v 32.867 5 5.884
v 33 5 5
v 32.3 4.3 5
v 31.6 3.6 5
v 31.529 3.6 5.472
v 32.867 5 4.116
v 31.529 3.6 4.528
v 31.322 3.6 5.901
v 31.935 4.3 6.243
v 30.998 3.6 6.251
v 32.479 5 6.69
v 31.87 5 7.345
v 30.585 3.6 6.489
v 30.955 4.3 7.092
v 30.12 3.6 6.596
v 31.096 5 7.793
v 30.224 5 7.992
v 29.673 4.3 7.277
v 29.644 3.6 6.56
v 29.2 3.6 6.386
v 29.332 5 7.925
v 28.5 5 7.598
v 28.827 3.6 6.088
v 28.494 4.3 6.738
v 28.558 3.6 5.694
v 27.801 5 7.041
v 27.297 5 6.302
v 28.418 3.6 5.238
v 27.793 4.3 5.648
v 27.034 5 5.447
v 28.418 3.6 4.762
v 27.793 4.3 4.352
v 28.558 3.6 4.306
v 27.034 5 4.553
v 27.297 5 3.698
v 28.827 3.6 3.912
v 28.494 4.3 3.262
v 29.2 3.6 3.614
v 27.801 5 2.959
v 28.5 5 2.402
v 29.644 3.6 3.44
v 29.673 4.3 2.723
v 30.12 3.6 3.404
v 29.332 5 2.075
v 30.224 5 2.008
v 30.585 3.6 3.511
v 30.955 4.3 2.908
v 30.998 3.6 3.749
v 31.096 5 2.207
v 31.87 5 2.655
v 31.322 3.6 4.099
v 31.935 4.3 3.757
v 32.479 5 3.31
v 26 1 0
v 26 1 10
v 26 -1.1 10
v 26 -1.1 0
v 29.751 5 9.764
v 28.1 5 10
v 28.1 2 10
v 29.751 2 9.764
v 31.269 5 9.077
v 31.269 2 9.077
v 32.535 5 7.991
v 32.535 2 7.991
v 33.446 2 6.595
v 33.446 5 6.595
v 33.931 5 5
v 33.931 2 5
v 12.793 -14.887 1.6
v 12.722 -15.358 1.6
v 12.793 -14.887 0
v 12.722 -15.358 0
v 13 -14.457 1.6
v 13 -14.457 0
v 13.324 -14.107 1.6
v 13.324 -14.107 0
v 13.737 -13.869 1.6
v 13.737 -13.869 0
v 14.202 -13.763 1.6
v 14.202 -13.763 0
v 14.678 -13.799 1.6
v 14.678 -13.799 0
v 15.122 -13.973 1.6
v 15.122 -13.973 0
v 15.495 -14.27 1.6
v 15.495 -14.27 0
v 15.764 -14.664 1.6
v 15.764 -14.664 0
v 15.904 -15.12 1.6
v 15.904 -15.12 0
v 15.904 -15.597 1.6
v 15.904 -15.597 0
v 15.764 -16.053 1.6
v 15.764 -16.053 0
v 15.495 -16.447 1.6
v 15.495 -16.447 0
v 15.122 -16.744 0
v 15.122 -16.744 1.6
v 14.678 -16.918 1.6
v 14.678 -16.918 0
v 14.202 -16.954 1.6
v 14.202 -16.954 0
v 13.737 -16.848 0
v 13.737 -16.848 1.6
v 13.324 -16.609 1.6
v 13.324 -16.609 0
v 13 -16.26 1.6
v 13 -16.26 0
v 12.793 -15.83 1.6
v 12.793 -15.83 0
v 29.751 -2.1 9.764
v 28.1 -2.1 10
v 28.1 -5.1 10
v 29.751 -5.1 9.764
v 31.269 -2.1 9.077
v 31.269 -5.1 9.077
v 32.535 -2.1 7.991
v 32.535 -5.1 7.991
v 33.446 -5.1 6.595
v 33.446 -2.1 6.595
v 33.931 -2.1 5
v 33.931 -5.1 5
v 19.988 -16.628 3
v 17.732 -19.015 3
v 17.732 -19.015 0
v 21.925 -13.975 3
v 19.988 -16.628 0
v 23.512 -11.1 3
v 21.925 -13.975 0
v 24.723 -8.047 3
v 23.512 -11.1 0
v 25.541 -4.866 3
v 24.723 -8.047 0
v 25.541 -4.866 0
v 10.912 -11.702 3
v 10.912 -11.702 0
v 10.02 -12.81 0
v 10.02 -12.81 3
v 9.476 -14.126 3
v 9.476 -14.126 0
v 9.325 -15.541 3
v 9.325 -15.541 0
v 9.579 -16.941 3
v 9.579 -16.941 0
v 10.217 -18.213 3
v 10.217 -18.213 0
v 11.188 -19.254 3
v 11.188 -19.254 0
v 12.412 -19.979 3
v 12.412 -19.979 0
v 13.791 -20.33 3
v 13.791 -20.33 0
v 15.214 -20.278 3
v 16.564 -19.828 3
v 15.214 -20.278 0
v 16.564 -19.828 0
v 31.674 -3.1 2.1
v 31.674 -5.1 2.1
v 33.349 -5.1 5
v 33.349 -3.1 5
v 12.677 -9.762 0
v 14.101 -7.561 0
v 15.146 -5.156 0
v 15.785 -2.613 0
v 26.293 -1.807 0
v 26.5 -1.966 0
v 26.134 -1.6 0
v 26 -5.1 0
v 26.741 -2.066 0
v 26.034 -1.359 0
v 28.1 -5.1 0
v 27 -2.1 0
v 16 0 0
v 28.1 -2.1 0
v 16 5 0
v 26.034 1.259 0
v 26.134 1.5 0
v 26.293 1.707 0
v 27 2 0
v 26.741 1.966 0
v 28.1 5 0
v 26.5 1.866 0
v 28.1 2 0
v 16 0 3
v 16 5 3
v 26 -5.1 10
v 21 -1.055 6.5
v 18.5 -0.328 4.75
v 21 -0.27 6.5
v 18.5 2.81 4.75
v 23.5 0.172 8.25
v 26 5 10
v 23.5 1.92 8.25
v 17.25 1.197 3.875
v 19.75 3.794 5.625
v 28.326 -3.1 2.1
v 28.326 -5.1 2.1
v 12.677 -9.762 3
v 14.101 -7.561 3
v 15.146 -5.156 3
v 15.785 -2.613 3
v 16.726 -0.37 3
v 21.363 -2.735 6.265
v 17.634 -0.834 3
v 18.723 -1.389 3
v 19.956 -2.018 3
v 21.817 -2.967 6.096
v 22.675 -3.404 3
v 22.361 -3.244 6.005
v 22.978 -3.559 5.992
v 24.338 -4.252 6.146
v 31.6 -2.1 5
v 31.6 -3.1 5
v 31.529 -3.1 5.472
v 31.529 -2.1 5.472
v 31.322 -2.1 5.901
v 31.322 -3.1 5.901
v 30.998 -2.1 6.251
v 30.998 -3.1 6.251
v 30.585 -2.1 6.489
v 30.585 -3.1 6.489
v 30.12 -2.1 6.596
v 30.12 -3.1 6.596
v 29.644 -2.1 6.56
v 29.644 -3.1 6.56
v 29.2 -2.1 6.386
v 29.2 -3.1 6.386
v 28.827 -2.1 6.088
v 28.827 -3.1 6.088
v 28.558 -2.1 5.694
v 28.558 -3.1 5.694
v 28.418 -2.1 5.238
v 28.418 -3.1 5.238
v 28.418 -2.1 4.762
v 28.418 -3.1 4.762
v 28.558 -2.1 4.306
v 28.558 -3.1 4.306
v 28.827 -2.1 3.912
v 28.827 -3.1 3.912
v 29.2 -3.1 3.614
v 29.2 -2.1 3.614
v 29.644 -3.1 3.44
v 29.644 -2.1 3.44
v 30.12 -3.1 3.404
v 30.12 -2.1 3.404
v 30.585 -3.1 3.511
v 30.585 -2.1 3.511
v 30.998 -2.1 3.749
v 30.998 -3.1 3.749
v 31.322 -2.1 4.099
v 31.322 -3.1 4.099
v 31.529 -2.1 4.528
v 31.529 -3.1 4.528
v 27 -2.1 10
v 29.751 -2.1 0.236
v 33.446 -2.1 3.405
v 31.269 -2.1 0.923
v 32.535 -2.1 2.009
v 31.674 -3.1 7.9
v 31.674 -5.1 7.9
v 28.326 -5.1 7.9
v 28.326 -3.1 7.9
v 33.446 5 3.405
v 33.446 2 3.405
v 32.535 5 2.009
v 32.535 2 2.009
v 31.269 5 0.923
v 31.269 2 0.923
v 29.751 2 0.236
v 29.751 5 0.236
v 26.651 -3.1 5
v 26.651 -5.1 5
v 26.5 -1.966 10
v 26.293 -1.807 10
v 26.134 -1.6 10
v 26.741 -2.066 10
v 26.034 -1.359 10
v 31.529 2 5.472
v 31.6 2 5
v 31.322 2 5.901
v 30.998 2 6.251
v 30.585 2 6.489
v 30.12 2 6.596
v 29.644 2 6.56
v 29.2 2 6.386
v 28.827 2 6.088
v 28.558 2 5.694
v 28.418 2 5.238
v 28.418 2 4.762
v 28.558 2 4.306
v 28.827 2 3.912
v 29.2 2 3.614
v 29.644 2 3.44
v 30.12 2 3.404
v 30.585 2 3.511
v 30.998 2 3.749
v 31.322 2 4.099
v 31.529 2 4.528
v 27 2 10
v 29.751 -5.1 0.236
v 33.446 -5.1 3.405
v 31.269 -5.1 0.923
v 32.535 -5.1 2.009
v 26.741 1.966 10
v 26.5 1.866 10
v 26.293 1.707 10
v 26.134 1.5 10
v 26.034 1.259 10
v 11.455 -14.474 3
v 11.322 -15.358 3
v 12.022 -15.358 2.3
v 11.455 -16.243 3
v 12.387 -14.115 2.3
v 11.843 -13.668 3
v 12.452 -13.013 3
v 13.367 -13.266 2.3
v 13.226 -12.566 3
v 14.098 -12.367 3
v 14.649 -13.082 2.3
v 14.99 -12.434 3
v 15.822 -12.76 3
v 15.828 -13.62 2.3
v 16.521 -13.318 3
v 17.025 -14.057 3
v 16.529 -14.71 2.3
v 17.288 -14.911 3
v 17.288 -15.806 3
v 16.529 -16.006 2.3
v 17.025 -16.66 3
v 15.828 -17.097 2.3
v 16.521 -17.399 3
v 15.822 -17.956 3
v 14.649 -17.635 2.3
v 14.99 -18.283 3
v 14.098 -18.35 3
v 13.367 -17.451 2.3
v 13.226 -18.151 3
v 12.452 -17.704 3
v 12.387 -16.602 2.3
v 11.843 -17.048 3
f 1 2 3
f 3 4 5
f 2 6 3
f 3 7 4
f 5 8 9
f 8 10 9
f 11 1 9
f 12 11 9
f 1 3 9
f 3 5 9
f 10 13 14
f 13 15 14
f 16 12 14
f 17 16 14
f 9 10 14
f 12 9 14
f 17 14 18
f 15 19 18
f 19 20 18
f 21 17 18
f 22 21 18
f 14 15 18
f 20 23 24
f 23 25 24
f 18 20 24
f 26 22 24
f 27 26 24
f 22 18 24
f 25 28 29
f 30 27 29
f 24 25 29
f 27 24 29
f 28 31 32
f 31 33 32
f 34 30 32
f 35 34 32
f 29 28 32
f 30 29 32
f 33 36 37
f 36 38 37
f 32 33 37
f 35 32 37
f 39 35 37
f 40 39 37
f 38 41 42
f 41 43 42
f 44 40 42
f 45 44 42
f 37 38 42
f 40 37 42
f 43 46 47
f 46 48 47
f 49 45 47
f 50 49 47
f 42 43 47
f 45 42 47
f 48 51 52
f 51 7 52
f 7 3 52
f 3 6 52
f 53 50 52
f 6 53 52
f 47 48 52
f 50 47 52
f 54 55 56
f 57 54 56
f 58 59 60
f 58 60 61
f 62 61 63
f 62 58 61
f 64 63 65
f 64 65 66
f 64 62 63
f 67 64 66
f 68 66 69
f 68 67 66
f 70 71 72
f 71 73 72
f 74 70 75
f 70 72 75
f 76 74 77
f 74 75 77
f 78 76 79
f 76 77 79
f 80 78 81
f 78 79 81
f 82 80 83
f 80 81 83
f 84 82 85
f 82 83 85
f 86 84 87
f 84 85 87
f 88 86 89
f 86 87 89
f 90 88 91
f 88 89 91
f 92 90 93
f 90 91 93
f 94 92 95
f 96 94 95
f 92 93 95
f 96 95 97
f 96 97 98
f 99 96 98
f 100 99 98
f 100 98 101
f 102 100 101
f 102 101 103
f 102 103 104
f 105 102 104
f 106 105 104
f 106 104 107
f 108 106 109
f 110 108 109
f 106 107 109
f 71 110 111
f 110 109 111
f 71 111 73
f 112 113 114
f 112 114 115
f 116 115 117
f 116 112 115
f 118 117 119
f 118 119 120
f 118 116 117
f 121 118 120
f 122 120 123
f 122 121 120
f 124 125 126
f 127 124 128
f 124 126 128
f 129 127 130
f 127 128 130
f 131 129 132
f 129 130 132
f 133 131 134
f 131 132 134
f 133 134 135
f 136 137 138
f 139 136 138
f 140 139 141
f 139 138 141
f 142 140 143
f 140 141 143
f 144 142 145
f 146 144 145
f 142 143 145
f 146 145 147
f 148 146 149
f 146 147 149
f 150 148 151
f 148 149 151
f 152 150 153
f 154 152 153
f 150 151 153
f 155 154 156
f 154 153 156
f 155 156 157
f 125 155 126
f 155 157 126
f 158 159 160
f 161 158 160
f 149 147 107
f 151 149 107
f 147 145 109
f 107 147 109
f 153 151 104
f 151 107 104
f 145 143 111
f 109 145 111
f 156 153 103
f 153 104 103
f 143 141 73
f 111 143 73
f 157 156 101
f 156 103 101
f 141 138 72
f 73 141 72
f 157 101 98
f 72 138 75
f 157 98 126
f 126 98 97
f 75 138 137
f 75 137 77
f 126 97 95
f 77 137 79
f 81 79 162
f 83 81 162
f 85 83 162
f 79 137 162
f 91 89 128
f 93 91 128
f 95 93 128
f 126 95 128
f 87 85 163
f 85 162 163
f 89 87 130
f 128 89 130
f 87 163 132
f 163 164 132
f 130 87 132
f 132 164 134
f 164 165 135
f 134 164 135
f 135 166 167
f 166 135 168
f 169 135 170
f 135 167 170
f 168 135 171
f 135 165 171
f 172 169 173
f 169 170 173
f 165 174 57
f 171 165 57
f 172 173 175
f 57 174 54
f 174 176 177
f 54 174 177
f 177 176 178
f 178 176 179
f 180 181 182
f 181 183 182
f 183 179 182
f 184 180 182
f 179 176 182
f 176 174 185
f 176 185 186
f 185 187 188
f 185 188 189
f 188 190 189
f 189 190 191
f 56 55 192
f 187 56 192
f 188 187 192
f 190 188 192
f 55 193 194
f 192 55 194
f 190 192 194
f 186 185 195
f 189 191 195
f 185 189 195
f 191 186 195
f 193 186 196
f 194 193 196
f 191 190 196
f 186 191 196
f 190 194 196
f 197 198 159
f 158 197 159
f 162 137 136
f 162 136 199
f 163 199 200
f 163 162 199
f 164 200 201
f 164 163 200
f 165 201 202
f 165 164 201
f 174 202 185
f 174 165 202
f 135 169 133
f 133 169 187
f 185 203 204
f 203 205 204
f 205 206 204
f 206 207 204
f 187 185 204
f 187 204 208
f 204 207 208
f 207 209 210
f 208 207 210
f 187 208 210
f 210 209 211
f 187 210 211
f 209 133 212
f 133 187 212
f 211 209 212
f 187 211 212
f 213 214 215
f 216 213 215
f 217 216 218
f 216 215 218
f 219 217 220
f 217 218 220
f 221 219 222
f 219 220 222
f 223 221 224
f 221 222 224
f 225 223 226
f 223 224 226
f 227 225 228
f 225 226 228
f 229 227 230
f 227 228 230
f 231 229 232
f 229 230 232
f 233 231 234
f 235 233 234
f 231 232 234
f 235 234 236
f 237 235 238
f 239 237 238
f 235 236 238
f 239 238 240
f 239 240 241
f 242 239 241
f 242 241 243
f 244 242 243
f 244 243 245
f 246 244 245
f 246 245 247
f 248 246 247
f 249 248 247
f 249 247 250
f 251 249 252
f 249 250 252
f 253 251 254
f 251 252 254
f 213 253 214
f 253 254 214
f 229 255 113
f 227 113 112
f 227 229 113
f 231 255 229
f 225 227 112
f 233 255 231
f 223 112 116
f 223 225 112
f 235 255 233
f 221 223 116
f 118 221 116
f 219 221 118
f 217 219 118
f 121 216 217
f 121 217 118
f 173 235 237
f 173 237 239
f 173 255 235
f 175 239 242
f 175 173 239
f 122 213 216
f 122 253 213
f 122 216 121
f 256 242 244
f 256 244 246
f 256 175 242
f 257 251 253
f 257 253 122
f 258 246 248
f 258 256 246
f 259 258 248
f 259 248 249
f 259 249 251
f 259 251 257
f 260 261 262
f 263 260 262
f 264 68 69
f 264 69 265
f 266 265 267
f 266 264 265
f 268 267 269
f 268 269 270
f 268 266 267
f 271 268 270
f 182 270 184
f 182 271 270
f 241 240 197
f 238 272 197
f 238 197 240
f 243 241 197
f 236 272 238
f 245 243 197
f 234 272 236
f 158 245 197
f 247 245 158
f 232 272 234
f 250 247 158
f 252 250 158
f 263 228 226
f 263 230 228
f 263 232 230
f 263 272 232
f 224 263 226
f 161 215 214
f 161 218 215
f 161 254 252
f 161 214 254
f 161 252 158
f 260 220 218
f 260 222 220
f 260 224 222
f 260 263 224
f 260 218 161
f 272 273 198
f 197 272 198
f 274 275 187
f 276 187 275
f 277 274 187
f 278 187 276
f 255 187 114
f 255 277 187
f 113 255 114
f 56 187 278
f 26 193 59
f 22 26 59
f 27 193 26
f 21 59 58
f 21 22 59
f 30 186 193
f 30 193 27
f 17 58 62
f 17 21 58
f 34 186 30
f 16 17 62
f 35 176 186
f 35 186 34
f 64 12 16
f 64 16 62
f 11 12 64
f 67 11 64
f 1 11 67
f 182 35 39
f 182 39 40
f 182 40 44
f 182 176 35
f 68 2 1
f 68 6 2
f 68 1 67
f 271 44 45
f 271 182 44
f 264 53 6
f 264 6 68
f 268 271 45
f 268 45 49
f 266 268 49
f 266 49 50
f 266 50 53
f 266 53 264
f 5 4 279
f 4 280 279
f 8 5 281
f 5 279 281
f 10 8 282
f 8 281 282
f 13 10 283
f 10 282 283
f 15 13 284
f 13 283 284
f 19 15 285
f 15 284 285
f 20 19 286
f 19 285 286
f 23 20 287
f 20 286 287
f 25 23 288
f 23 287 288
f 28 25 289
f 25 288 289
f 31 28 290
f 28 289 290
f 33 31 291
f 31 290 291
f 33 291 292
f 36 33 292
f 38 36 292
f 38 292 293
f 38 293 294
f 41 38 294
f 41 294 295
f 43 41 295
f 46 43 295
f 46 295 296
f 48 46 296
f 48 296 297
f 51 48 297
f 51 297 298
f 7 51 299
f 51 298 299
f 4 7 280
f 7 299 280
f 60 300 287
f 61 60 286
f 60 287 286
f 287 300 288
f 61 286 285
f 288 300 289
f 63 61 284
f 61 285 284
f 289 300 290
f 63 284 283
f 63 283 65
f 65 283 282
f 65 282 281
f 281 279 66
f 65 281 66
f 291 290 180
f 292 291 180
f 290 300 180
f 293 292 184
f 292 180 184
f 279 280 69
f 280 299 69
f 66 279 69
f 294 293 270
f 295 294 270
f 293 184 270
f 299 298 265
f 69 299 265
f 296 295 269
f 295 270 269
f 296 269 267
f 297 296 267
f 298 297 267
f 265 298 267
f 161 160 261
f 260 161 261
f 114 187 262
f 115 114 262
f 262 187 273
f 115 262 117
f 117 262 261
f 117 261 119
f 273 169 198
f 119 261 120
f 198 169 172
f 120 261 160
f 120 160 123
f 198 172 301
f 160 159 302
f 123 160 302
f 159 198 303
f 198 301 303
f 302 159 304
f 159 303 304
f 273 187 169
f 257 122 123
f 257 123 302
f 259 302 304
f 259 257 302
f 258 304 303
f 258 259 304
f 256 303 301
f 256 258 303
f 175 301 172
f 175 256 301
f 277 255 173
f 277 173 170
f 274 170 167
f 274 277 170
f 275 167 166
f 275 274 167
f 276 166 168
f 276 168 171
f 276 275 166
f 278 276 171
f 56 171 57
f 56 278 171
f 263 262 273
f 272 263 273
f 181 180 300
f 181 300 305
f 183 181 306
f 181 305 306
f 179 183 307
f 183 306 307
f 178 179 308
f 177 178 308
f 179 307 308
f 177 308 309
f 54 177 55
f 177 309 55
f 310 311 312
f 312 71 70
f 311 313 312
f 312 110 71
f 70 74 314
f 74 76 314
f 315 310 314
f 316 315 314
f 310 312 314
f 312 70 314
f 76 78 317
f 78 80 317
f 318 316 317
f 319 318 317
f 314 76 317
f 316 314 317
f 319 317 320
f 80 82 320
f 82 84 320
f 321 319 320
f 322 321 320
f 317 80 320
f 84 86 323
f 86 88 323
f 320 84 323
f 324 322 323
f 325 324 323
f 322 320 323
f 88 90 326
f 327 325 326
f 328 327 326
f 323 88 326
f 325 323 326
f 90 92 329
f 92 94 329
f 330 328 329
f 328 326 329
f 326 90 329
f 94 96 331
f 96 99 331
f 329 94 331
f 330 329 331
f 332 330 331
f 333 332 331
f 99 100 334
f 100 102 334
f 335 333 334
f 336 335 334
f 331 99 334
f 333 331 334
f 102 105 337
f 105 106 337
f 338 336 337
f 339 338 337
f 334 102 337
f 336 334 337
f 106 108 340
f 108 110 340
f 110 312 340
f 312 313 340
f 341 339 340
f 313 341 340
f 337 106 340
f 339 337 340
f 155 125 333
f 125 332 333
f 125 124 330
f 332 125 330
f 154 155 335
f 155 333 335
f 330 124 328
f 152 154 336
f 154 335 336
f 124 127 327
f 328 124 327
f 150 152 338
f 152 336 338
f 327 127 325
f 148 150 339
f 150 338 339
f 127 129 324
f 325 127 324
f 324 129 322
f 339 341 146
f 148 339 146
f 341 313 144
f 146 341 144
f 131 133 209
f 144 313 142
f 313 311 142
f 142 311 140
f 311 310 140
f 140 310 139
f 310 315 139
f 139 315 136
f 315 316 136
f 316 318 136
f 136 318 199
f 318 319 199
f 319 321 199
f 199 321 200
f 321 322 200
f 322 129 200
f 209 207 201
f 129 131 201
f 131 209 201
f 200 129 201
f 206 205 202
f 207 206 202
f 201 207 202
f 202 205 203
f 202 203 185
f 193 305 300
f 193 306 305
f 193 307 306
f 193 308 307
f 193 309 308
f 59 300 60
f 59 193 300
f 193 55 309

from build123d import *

# Parameters (mm, degrees)
PAD_DEPTH           = 3
HOLE_D              = 3.2
HOLE_CSINK_D        = 6
HOLE_CSINK_ANGLE    = 90
SKETCH002_W         = 5
SKETCH002_H         = 3
SKETCH003_W         = 10.1
SKETCH003_H         = 10
SKETCH004_W         = 8
SKETCH004_H         = 3
PAD001_DEPTH        = 10
FILLET_R            = 1
POCKET_DEPTH        = 25.359393
HOLE001_D           = 3.2
HOLE001_CSINK_D     = 6
HOLE001_CSINK_ANGLE = 90
POCKET001_DEPTH     = 2


with BuildPart() as part:
    # Sketch → Pad (new body)
    with BuildSketch(Plane.XY):
        with BuildLine():
            ThreePointArc((10.912011, -11.701625), (14.672971, -6.379962), (16, 0))
            Line((16, 0), (16, 5))
            Line((26, 5), (16, 5))
            Line((26, 5), (26, 0))
            ThreePointArc((17.731994, -19.015162), (23.843572, -10.367453), (26, 0))
            ThreePointArc((10.912011, -11.701625), (10.665234, -18.768385), (17.731994, -19.015162))
        make_face()
    extrude(amount=PAD_DEPTH)

    # Hole (through all)
    with Locations(Plane.XY.offset(3)):
        with Locations((14.322002, -15.358393)):
            CounterSinkHole(HOLE_D / 2, HOLE_CSINK_D / 2, counter_sink_angle=HOLE_CSINK_ANGLE)

    # Sketch002 (on Face6 of Hole) → AdditiveLoft section 0
    with BuildSketch(Plane(origin=(16, 0, 0), x_dir=(0, -1, 0), z_dir=(-1, 0, 0))):
        with Locations((-2.5, 1.5)):
            Rectangle(SKETCH002_W, SKETCH002_H)
    # Sketch003 (on Face7 of Hole) → AdditiveLoft section 1
    with BuildSketch(Plane.YZ.offset(26)):
        with Locations((-0.05, 5)):
            Rectangle(SKETCH003_W, SKETCH003_H)
    loft()

    # Sketch004 → Pad001 (join)
    with BuildSketch(Plane.XY):
        with Locations((30, 3.5)):
            Rectangle(SKETCH004_W, SKETCH004_H)
        with Locations((30, -3.6)):
            Rectangle(SKETCH004_W, SKETCH004_H)
    extrude(amount=PAD001_DEPTH)

    # Fillet
    fillet_edges = [part.edges().sort_by_distance(p)[0] for p in [
        (26, 2, 5),
        (26, -2.1, 5),
    ]]
    fillet(fillet_edges, radius=FILLET_R)

    # Sketch005 (on Face14 of Fillet) → Pocket (cut, through all)
    with BuildSketch(Plane(origin=(0, 5, 0), x_dir=(-1, 0, 0), z_dir=(0, 1, 0))):
        with BuildLine():
            Line((-34, 10), (-28.1, 10))
            ThreePointArc((-28.1, 10), (-32.27193, 8.27193), (-34, 4.1))
            Line((-34, 10), (-34, 4.1))
        make_face()
        with BuildLine():
            Line((-34, 0), (-34, 5.9))
            ThreePointArc((-34, 5.9), (-32.27193, 1.72807), (-28.1, 0))
            Line((-34, 0), (-28.1, 0))
        make_face()
    extrude(amount=-POCKET_DEPTH, mode=Mode.SUBTRACT)

    # Hole001 (through all)
    with Locations(Plane(origin=(0, 5, 0), x_dir=(-1, 0, 0), z_dir=(0, 1, 0))):
        with Locations((-30, 5)):
            CounterSinkHole(HOLE001_D / 2, HOLE001_CSINK_D / 2, counter_sink_angle=HOLE001_CSINK_ANGLE)

    # Sketch007 (on Face17 of Hole001) → Pocket001 (cut)
    with BuildSketch(Plane.XZ.offset(5.1)):
        Polygon((33.348632, 5), (31.674316, 7.9), (28.325684, 7.9), (26.651368, 5), (28.325684, 2.1), (31.674316, 2.1), align=None)
    extrude(amount=-POCKET001_DEPTH, mode=Mode.SUBTRACT)


solid = part.part
